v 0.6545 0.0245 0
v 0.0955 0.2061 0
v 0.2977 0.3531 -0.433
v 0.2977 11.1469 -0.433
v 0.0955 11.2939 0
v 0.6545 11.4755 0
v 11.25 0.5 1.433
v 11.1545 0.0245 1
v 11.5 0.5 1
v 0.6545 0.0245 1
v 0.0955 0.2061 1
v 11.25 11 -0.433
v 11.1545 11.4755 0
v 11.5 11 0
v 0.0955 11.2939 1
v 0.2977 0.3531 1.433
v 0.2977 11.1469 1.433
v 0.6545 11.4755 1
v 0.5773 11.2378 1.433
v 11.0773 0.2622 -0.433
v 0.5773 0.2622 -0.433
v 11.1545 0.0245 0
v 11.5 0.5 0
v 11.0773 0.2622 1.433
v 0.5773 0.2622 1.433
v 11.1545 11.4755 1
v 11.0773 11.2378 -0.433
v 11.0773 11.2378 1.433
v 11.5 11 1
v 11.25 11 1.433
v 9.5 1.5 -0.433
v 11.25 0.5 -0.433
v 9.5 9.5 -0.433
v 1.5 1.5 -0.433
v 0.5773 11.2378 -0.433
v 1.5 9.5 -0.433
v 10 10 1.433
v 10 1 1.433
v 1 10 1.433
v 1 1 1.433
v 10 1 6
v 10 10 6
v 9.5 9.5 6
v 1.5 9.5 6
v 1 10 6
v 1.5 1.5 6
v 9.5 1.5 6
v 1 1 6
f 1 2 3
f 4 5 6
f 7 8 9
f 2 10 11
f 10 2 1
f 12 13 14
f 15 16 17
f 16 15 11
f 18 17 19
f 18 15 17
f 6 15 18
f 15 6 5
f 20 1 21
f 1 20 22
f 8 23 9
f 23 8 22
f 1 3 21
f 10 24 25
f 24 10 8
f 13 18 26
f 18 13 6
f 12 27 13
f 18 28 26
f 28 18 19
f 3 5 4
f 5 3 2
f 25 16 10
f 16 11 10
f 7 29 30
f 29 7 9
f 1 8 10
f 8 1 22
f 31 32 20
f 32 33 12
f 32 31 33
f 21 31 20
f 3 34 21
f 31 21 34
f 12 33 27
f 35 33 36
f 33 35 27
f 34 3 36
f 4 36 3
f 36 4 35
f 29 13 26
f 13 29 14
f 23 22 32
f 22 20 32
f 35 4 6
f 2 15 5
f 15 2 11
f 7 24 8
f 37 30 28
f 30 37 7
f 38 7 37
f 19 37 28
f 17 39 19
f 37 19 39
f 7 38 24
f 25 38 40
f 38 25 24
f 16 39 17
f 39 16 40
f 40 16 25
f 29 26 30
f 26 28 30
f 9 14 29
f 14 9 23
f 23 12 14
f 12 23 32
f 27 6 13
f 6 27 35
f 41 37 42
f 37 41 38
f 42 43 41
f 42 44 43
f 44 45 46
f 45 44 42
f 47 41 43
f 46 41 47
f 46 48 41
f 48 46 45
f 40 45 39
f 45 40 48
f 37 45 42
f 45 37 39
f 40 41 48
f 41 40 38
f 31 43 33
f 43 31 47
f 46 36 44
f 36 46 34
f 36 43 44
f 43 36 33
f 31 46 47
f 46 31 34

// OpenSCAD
// file: multiprint.scad
//----------------------------------------------------------------------
// multiprint.scad -- make it easy to print one or several of an item
//
// For your reference, it seems the Makerbot 2 bed
// has dimensions:  width = 285, depth = 153.
//
// example:
//
//     several(4,4,5)
//         cube([2,3,3]);
//----------------------------------------------------------------------

module several(a,b,itemwd,itemht) {
    // the odd math makes a single item line up with the x and y axes
    translate([-((a-1)*itemwd)/2,-((b-1)*itemht)/2,0]) {
        for (a0=[0:a-1]) {
            for (b0=[0:b-1]) {
                translate([a0*itemwd,b0*itemht,0])
                    child();
            }
        }
    }
}

//----------------------------------------------------------------------
// row -- print several items in a row
//
// example:  row(10) { sphere(1); sphere(5); sphere(10); }
//----------------------------------------------------------------------
module row(wid) {
  for (i = [0 : $children-1]) 
    translate([i*wid,0,0])
      child(i);
}
// main file
//----------------------------------------------------------------------
// endpiece.scad -- piece for the end of each arm
//
// The main purpose of this piece is to prevent chafing of the
// motor wires against the relatively sharp edges of the fiberglass
// arm.  A future version might incorporate a protrusion to protect
// the exposed motor wires at the end of the arm.
//----------------------------------------------------------------------

D1 = 8;
D2 = 9;
D3 = 11;

Len=5;
Overhang=1;

module item() {

    difference() {
        union() {
            translate([.5,.5,0]) {
                minkowski() {
                   cube([D3-.5,D3-.5,Overhang]);
                   sphere(.5);
                }
            }
            translate([(D3-D2)/2,(D3-D2)/2,0])
                cube([D2,D2,Len+Overhang]);
        }
        translate([(D3-D1)/2,(D3-D1)/2,-1])
            cube([D1,D1,Len+Overhang+2]);
    }

//  difference() {
 //     cube([D2,D2,Len+Overhang]);
  //    translate([(D2-D1)/2,(D2-D1)/2,-1])
   //       cube([D1,D1,Len+Overhang+2]);
 // }

}

include <multiprint.scad>
several(1,1,15,15) item();
